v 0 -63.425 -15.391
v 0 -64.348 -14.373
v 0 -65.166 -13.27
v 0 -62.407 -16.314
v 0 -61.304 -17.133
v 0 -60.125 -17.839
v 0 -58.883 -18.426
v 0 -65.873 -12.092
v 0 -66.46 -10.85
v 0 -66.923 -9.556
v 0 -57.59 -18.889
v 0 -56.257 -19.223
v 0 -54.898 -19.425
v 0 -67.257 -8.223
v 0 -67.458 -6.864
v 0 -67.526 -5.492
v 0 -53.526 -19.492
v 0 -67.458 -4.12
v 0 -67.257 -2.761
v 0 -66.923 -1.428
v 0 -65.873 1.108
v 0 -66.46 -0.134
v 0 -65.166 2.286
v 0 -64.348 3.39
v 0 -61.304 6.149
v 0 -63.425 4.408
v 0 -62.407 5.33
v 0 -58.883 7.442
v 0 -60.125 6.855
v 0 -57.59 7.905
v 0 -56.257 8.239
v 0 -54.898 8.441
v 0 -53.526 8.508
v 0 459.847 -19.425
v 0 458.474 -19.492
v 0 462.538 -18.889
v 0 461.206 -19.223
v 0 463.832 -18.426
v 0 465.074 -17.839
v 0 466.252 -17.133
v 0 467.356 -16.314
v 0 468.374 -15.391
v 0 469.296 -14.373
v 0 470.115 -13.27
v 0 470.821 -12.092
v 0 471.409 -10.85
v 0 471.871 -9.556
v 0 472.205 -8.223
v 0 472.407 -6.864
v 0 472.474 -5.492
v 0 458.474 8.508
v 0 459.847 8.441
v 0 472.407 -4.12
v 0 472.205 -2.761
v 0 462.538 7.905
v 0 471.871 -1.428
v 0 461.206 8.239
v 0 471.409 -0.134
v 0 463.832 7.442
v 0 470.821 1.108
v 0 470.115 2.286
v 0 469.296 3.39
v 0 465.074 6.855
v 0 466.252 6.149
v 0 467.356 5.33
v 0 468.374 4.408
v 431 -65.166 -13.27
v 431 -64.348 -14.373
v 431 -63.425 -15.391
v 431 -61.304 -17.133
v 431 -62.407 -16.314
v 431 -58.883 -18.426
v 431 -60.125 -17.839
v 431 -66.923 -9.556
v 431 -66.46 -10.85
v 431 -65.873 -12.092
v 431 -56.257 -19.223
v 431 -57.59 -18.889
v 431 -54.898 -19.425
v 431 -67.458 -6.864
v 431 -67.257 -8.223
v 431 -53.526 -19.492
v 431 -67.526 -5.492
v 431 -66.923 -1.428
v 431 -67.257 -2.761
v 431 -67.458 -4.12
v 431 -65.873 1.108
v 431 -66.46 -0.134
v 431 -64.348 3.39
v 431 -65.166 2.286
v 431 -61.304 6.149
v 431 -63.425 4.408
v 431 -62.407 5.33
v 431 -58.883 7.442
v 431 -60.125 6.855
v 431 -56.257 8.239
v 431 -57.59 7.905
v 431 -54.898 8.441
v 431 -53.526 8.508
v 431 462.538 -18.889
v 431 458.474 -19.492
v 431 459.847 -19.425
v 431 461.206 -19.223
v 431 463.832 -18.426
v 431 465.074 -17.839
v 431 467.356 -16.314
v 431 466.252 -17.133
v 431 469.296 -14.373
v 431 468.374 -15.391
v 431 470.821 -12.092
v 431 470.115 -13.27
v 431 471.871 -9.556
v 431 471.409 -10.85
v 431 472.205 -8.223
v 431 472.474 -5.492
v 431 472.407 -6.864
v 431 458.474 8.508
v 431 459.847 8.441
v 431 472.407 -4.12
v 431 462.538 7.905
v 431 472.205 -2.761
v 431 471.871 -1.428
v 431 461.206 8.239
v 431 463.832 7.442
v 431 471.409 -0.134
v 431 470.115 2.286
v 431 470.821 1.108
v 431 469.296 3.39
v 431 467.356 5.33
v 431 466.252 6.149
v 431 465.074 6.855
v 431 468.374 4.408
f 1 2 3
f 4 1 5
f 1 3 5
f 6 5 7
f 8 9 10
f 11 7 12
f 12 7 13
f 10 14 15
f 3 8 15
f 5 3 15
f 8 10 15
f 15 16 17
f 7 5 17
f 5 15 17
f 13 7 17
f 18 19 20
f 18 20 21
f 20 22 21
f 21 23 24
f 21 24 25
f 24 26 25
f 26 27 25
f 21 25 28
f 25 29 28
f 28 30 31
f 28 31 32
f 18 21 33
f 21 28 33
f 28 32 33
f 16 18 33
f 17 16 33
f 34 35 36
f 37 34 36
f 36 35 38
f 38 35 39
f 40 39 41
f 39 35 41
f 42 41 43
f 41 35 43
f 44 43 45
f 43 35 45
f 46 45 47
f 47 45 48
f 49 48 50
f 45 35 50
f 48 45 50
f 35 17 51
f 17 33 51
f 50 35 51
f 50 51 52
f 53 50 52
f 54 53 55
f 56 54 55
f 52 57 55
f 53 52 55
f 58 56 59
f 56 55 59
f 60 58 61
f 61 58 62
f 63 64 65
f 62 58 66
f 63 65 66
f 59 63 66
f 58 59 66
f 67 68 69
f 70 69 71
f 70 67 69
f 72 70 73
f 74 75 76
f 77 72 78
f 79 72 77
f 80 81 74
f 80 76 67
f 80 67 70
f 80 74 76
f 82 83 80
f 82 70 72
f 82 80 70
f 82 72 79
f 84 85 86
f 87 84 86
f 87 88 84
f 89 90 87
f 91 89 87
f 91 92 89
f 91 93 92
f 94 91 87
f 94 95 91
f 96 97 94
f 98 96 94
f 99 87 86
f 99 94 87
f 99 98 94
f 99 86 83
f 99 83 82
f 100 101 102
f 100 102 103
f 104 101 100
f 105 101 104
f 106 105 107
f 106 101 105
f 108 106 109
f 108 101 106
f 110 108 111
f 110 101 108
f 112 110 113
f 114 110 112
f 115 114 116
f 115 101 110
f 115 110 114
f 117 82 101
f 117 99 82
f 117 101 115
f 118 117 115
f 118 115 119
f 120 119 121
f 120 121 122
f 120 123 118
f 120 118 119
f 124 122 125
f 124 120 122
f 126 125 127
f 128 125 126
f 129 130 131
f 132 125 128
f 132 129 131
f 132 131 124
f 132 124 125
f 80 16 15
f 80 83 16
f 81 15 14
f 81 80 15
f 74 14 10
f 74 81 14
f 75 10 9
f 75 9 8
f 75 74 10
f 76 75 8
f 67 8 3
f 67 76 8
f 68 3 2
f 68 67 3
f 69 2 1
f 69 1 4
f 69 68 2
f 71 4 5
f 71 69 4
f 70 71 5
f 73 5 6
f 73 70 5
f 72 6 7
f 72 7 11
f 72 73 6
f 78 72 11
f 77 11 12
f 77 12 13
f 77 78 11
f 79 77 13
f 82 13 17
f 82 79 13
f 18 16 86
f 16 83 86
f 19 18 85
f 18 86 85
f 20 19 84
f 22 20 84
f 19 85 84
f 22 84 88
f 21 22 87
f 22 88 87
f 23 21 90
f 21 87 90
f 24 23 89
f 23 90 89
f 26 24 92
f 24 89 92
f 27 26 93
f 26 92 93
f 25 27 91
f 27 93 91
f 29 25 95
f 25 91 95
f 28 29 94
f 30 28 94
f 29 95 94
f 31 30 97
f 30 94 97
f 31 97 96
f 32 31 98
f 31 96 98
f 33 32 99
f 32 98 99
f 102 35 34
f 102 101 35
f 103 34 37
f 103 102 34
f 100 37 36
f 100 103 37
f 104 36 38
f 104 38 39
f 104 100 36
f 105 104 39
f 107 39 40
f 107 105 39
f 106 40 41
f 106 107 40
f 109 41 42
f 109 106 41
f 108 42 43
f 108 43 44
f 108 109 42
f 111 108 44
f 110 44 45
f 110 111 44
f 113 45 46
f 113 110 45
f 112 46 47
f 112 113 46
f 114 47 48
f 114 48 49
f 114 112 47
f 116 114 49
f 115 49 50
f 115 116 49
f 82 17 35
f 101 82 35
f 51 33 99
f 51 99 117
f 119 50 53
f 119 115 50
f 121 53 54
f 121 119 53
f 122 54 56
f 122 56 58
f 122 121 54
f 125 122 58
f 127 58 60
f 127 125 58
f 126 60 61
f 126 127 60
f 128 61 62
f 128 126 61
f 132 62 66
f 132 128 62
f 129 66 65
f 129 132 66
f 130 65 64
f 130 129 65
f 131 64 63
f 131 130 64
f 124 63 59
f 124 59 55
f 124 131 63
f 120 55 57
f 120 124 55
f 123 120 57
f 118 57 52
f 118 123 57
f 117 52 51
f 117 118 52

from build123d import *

# Parameters (mm, degrees)
F0_W     = 540
F0_H     = 28
F1_DEPTH = 431
F2_R     = 13.99999


# Not quite as in the source:
# - a fillet or chamfer is up to 0.001 mm smaller than in the source, because OpenCascade refuses the exact size


with BuildPart() as f1:
    # F0 (on Right) → F1 (new body)
    with BuildSketch(Plane.YZ):
        with Locations((202.4743151665, -5.4919481874)):
            Rectangle(F0_W, F0_H)
    extrude(amount=F1_DEPTH)

    # F2 (radius 14 in the source; OpenCascade refuses exactly that, so slightly less here)
    f2_edges = [f1.edges().sort_by_distance(p)[0] for p in [
        (215.5, -67.525685, 8.508052),
        (215.5, -67.525685, -19.491948),
        (215.5, 472.474315, 8.508052),
        (215.5, 472.474315, -19.491948),
    ]]
    fillet(f2_edges, radius=F2_R)


solid = f1.part
